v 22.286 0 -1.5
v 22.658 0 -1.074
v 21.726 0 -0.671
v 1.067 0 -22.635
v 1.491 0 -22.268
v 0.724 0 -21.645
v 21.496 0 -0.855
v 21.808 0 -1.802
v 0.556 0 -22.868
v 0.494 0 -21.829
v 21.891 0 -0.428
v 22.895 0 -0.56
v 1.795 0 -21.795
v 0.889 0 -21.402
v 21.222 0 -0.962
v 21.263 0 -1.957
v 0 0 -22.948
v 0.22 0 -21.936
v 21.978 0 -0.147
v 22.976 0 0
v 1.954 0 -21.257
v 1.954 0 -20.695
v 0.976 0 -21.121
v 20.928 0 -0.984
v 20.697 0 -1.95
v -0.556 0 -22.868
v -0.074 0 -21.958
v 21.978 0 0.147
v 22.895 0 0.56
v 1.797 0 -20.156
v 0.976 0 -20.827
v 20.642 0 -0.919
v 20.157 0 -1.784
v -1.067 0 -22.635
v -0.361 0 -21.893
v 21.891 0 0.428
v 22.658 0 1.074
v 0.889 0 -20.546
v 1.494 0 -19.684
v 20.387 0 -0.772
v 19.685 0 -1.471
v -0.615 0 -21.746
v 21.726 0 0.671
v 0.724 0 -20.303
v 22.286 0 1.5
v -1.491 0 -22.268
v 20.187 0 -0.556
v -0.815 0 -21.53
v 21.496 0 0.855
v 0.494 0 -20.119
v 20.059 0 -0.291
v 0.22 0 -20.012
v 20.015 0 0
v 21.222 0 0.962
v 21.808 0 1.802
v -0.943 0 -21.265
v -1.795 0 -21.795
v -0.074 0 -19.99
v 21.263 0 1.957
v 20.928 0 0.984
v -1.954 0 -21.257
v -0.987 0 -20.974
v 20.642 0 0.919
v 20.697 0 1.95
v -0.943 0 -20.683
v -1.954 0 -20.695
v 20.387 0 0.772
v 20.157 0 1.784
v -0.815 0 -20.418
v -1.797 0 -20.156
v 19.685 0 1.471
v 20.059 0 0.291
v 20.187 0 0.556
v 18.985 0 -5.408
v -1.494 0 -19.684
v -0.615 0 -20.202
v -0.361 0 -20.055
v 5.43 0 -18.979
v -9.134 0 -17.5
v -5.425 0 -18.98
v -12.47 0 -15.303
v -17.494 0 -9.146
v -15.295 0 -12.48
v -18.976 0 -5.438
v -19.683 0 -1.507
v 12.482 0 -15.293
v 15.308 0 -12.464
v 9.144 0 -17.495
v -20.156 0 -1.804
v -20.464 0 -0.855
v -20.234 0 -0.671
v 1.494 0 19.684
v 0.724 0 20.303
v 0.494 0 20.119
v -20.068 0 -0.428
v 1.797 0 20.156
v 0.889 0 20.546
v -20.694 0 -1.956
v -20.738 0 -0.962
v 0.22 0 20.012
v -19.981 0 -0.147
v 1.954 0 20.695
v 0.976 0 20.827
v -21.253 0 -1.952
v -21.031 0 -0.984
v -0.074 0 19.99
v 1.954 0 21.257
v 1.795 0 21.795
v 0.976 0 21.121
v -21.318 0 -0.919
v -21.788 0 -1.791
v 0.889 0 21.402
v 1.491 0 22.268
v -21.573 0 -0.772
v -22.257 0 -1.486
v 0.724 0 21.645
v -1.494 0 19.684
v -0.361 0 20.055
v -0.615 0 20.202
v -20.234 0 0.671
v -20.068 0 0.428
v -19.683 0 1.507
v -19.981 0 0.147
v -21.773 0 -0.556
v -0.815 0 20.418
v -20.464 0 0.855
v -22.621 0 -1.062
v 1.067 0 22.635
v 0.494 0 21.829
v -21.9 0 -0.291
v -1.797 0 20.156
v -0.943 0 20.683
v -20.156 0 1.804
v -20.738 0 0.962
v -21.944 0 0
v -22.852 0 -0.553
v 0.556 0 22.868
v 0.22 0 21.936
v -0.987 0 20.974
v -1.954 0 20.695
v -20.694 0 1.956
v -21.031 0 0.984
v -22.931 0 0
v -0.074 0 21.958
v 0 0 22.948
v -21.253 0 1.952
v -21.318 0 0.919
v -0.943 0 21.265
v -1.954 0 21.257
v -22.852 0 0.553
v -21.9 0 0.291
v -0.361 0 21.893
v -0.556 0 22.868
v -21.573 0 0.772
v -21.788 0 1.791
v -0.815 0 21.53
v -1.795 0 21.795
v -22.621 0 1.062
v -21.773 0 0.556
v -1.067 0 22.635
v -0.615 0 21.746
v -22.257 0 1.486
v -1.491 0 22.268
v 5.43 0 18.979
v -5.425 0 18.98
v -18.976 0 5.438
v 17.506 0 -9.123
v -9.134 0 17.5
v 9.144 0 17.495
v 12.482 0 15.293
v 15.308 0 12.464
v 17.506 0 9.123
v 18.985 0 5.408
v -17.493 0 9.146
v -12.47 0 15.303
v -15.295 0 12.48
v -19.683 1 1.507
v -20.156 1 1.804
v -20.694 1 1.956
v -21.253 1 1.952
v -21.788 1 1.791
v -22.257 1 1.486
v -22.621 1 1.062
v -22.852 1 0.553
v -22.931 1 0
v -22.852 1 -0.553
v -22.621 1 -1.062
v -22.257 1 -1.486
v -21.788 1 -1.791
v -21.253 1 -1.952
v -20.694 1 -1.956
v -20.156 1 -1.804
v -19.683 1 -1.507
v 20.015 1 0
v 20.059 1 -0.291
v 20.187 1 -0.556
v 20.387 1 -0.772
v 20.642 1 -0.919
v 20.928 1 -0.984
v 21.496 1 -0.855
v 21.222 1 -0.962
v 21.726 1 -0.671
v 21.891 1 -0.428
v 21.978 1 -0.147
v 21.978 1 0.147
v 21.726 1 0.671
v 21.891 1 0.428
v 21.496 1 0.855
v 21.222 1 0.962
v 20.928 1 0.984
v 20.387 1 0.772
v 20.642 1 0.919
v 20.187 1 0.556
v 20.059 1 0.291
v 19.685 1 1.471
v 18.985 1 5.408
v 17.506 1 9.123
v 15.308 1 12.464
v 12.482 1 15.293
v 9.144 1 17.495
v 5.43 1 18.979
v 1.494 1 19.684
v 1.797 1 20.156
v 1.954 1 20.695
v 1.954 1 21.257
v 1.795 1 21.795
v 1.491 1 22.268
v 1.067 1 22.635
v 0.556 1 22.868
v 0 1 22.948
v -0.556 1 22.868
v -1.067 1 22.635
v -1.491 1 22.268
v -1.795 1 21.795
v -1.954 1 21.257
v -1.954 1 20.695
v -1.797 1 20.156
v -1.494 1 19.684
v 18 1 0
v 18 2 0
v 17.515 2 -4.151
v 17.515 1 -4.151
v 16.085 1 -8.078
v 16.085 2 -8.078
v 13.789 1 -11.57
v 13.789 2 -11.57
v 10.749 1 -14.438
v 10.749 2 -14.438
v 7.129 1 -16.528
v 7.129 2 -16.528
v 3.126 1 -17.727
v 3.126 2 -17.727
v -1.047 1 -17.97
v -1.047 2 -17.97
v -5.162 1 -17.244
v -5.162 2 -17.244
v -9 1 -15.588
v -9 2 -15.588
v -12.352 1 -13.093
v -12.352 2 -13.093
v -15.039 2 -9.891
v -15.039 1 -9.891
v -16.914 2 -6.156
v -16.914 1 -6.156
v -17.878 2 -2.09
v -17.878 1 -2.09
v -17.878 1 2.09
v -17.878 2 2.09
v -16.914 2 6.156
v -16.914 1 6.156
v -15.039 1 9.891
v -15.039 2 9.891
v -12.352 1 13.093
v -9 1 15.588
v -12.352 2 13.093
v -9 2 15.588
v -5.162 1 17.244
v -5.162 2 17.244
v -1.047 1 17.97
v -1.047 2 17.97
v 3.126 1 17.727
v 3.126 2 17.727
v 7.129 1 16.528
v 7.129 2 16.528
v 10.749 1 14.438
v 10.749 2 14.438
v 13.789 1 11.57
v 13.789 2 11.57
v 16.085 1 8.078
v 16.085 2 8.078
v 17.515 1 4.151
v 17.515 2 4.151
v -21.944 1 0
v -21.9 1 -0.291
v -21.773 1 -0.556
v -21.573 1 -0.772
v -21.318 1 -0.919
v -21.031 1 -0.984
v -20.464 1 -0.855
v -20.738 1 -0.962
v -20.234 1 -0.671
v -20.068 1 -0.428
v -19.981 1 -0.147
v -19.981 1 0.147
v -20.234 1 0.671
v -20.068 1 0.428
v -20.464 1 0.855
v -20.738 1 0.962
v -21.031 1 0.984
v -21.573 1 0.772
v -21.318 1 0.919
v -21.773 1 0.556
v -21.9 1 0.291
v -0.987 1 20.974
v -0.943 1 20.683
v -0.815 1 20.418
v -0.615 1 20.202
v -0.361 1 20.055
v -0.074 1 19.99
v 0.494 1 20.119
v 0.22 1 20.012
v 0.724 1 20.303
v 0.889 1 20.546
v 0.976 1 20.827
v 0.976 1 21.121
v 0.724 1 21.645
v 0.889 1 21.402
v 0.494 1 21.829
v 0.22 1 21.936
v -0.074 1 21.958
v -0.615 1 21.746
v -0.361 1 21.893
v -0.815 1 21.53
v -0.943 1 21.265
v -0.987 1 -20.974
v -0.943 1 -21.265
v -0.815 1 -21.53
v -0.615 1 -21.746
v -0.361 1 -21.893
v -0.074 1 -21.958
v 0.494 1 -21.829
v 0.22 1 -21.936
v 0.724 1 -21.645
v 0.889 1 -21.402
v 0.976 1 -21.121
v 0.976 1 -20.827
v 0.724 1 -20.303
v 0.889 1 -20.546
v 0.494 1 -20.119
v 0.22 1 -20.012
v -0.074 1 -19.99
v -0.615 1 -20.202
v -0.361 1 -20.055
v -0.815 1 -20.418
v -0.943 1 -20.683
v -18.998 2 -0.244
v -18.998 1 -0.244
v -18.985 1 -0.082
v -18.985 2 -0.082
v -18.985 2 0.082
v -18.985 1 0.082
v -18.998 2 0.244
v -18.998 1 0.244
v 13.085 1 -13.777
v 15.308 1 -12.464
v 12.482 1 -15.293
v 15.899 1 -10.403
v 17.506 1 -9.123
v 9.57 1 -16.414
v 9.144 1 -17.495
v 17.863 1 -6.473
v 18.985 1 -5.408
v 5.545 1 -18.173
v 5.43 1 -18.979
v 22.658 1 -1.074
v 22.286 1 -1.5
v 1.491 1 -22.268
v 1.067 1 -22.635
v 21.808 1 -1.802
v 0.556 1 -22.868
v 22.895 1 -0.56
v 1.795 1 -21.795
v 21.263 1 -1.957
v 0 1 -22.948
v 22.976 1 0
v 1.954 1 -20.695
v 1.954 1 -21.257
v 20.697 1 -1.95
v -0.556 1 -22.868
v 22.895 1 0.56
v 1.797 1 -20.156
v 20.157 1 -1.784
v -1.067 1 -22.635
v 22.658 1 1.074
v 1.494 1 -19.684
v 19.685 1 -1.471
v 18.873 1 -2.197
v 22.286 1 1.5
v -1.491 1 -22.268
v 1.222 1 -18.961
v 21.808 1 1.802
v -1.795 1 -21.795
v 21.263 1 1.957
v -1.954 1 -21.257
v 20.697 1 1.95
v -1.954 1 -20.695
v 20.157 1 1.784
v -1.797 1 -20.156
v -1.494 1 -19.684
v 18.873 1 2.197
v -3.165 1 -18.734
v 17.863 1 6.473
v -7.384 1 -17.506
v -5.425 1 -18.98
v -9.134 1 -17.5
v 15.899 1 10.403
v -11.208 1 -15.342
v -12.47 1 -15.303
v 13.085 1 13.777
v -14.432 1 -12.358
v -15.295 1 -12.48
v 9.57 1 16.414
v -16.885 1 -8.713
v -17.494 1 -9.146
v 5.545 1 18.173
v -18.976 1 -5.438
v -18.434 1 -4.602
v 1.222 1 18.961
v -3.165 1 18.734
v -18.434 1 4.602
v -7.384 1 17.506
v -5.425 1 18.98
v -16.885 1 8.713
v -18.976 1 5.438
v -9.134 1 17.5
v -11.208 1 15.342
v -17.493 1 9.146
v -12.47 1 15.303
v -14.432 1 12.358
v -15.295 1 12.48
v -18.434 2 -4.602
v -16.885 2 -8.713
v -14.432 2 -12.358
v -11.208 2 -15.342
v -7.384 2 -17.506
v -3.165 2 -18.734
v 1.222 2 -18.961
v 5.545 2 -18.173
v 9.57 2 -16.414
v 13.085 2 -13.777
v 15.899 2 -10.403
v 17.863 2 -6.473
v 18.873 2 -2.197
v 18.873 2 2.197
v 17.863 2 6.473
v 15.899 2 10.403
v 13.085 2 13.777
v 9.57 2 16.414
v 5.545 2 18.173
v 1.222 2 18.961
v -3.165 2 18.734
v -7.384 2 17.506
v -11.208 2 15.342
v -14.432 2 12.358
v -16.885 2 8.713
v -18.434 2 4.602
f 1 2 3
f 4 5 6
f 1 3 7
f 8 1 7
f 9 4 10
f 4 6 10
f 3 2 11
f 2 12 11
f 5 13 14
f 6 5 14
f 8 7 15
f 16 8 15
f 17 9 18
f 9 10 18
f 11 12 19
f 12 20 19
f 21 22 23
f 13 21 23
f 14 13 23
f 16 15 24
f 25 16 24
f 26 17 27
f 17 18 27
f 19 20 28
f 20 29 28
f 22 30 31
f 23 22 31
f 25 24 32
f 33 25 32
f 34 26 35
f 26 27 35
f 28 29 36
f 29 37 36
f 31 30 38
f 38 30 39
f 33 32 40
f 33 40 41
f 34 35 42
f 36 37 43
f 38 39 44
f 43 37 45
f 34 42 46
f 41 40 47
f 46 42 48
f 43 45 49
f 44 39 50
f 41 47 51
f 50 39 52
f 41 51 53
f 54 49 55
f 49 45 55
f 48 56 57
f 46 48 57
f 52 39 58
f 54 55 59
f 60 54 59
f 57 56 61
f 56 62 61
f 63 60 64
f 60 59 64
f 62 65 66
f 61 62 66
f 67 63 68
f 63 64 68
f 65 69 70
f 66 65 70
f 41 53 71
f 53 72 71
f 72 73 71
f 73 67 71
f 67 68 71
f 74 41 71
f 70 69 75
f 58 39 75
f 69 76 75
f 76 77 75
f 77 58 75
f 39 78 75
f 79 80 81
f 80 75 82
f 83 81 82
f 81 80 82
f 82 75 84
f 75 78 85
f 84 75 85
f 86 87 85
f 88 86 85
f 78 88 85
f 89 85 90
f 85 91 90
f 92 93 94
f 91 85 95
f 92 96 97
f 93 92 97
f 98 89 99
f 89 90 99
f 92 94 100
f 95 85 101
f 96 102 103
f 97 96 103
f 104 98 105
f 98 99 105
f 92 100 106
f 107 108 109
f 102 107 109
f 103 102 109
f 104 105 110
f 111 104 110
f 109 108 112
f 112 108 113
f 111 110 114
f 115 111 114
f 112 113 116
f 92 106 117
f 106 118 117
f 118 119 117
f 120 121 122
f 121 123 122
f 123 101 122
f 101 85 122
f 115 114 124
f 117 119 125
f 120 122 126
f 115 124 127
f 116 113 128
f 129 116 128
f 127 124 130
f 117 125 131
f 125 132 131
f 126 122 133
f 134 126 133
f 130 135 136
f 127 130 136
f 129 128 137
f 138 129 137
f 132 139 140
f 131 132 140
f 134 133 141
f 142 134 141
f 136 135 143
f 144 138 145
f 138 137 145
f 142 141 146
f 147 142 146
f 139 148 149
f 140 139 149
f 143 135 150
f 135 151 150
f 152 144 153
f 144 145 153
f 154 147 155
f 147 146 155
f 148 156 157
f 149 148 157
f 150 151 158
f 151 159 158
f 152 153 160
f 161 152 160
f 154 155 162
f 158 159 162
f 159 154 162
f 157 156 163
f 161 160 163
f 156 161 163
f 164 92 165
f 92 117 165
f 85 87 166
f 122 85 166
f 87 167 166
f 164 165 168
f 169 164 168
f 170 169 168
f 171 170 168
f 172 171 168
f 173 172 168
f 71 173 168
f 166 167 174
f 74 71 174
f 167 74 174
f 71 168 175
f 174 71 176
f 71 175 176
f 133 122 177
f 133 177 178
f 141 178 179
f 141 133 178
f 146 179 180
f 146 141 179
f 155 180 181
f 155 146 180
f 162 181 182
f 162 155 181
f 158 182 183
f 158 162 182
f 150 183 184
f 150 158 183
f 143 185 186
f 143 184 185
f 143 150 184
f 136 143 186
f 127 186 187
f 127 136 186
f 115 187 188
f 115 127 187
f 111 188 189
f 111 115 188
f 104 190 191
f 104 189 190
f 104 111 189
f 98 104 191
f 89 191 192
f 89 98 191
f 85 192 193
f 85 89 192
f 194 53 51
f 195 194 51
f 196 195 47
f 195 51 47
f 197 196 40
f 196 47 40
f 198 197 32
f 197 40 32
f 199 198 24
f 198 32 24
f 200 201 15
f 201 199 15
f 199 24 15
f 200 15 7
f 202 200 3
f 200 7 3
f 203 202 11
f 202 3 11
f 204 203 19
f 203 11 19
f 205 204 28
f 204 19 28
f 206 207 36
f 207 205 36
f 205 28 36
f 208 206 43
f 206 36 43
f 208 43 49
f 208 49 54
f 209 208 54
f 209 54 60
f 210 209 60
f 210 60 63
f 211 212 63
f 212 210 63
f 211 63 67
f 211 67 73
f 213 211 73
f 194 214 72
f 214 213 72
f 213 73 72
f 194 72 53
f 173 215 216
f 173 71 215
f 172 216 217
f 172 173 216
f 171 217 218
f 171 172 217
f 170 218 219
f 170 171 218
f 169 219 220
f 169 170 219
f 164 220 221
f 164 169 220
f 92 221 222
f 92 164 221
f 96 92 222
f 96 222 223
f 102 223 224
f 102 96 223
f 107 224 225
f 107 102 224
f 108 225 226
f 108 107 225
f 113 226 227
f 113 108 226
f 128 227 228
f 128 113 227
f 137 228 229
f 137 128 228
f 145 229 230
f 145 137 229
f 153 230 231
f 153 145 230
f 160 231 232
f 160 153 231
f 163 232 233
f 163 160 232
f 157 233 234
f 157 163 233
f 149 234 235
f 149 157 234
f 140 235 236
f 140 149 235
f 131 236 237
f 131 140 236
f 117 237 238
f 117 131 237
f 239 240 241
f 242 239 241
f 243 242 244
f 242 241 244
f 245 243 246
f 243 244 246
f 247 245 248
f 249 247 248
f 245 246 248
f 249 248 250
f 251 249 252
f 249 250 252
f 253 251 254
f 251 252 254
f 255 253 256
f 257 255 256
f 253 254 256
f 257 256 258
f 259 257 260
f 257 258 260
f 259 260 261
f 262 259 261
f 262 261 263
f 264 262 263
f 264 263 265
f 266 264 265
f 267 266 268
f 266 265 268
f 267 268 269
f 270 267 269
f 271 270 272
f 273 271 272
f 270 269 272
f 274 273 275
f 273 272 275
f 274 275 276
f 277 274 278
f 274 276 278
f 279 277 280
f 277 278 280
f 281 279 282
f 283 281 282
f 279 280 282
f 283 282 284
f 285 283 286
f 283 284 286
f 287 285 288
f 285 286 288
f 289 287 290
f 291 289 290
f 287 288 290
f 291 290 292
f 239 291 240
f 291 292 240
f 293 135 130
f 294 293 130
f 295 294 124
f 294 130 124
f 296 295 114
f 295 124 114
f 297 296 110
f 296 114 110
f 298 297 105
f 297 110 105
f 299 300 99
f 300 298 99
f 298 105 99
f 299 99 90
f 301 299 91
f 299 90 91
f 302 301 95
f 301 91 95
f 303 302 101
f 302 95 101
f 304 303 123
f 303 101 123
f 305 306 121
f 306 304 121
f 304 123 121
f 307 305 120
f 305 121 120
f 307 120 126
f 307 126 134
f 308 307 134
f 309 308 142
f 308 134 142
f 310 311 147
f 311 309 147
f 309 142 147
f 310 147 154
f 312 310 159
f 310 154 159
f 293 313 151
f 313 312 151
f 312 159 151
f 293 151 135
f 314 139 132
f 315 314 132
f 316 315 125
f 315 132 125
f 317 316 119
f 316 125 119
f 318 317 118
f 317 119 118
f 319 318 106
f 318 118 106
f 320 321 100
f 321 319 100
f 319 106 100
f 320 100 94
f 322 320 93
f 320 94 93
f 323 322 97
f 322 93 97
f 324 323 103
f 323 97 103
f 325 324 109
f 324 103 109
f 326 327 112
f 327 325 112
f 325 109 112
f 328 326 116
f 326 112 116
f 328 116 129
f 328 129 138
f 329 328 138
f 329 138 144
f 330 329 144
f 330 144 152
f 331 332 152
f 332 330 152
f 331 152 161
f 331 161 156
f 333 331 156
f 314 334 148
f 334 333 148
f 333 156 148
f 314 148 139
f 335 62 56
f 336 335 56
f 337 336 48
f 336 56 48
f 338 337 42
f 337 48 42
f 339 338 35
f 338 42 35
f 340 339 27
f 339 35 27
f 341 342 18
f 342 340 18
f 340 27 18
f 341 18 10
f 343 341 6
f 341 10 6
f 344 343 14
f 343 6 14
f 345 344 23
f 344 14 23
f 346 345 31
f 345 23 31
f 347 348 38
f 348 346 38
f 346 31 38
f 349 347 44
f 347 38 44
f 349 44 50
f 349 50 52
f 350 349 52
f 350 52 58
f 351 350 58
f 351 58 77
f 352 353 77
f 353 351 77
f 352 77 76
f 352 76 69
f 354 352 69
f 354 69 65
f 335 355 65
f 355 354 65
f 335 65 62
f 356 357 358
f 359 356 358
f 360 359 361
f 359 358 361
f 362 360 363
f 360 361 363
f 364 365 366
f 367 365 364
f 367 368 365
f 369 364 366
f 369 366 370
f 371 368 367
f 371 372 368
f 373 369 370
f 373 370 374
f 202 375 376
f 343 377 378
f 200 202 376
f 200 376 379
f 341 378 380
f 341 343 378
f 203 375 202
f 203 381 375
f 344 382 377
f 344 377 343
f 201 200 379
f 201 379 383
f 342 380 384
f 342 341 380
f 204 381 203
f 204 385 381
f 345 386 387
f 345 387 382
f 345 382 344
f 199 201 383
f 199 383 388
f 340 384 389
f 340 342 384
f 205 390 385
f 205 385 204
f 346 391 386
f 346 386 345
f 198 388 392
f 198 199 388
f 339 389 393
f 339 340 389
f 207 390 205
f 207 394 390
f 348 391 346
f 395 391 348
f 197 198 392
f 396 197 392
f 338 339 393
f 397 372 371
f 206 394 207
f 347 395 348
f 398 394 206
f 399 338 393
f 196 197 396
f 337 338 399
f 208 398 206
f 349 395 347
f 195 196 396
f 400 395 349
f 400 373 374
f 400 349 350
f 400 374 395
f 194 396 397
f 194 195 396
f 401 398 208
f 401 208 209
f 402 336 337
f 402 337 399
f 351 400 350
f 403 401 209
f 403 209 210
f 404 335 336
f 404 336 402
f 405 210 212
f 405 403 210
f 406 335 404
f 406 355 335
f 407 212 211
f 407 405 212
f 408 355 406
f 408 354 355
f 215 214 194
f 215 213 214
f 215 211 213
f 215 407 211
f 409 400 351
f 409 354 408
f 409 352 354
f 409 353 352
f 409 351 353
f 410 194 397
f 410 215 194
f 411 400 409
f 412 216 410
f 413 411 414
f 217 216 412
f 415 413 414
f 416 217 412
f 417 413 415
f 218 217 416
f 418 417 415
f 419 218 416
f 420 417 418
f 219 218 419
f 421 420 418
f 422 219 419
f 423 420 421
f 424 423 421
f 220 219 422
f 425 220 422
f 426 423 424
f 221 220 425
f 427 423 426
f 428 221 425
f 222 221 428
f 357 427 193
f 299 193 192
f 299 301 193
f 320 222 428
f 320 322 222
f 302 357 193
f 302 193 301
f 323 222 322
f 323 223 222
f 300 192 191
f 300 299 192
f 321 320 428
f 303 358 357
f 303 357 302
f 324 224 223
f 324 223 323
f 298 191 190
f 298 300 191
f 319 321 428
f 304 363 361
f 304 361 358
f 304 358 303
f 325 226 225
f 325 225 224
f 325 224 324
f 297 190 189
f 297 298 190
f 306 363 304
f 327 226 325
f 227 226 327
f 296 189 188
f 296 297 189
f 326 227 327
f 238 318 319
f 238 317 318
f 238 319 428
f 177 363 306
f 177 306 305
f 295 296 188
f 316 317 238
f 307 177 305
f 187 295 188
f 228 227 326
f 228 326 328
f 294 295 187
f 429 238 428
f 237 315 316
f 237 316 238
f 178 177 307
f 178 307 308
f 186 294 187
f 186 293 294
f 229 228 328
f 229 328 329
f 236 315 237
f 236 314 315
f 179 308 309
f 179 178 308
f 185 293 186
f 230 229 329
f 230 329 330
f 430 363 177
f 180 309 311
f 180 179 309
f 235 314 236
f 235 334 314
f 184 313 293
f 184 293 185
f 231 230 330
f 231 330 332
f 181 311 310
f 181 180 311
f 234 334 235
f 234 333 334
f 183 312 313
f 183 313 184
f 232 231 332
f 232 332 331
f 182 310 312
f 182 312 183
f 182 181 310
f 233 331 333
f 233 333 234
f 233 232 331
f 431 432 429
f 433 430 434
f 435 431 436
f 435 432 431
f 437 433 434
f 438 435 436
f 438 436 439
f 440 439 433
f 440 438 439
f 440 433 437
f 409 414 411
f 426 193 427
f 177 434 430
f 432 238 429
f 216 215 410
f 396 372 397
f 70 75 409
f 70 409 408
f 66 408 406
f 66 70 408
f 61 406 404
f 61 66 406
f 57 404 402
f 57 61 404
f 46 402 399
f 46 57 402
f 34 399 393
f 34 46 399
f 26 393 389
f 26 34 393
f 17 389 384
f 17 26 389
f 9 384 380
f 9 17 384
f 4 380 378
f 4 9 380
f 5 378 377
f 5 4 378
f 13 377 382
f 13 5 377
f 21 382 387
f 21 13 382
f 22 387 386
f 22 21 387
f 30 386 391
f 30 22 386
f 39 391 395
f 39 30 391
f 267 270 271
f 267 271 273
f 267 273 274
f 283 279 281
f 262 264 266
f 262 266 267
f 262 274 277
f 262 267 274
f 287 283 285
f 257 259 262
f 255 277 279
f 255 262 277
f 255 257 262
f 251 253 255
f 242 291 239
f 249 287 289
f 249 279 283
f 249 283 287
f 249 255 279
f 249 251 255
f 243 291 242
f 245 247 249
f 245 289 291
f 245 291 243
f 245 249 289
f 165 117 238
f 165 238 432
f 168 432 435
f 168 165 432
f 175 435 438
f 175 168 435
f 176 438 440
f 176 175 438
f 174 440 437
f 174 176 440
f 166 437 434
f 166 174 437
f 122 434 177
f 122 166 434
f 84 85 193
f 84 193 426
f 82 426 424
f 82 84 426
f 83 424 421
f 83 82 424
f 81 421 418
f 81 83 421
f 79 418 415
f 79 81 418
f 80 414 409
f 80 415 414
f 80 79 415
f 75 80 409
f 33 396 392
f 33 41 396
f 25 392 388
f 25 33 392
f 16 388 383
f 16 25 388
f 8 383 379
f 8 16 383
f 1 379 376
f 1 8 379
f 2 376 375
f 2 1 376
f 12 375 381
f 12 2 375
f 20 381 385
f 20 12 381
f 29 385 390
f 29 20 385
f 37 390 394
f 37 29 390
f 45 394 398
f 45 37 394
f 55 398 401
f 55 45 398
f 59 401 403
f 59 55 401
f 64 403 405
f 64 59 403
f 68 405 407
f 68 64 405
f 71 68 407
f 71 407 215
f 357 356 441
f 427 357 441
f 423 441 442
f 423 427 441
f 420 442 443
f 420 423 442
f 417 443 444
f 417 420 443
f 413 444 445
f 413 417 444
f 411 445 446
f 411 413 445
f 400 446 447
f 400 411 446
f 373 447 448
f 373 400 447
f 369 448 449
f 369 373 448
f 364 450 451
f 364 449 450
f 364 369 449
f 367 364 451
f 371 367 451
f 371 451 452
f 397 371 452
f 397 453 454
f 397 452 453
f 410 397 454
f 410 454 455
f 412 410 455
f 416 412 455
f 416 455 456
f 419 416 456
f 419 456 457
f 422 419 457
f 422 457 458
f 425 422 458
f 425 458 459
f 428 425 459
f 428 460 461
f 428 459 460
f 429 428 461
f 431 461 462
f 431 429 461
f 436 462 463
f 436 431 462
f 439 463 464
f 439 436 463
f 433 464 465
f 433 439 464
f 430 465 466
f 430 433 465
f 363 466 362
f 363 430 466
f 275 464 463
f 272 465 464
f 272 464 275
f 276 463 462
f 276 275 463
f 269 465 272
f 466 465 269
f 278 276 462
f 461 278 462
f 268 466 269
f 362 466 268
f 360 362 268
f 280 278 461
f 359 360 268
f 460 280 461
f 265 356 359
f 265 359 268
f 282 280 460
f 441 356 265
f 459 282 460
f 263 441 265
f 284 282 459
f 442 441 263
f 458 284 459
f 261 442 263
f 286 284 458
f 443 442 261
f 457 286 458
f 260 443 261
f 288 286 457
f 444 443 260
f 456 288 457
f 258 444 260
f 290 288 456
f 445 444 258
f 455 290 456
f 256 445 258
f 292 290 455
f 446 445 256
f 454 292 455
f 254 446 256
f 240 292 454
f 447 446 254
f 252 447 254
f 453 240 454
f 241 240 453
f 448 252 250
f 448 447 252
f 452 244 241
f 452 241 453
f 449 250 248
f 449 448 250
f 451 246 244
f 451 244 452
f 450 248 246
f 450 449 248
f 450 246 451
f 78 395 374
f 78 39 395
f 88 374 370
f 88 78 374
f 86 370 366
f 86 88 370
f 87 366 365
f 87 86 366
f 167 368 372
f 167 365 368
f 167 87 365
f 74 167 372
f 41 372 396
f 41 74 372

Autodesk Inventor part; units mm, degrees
ref_plane "YZ Plane" through (0, 0, 0) normal (1, 0, 0) x (0, 1, 0)
ref_plane "XZ Plane" through (0, 0, 0) normal (0, 1, 0) x (-1, 0, 0)
ref_plane "XY Plane" through (0, 0, 0) normal (0, 0, 1) x (1, 0, 0)
sketch "Sketch1" plane through (0, 0, 0) normal (0, 1, 0) x (-1, 0, 0)
  arc A0 (18.9984, 0.2445) -> (18.9984, -0.2445) centre (0, 0) ccw
  circle A1 centre (0, 20.974) radius 0.987
  circle A2 centre (0, -20.974) radius 0.987
  arc A3 (18.9984, 0.2445) -> (18.9984, -0.2445) centre (0, 0) ccw
  arc A4 (18.9984, 0.2445) -> (18.9984, -0.2445) centre (20.9573, 0) ccw
  circle A5 centre (20.9573, 0) radius 0.987
  circle A6 centre (-21.0021, 0) radius 0.987
  arc A7 (-1.4939, 19.6837) -> (-19.6854, 1.4707) centre (0, 0) ccw
  arc A8 (-19.6854, 1.4707) -> (-19.6854, -1.4707) centre (-21.0021, 0) ccw
  arc A9 (-19.6854, -1.4707) -> (-1.4939, -19.6837) centre (0, 0) ccw
  arc A10 (-1.4939, -19.6837) -> (1.4939, -19.6837) centre (0, -20.974) ccw
  arc A11 (1.4939, -19.6837) -> (19.6826, -1.5074) centre (0, 0) ccw
  arc A12 (19.6826, -1.5074) -> (19.6826, 1.5074) centre (20.9573, 0) ccw
  arc A13 (19.6826, 1.5074) -> (1.4939, 19.6837) centre (0, 0) ccw
  arc A14 (1.4939, 19.6837) -> (-1.4939, 19.6837) centre (0, 20.974) ccw
  dimension "d0" = 19
extrude "Extrusion1" add sketch "Sketch1" along normal blind 1
sketch "Sketch2" plane through (0, 1, 0) normal (0, 1, 0) x (1, 0, 0)
  arc A0 (-18.9984, -0.2445) -> (-18.9984, 0.2445) centre (0, 0) ccw projected
  arc A1 (-18.9984, -0.2445) -> (-18.9984, 0.2445) centre (-20.9573, 0) ccw projected
  arc A2 (-18.9984, -0.2445) -> (-18.9984, 0.2445) centre (0, 0) ccw projected
  circle A3 centre (-20.9573, 0) radius 0.987 projected
  circle A4 centre (0, 20.974) radius 0.987 projected
  circle A5 centre (21.0021, 0) radius 0.987 projected
  circle A6 centre (0, -20.974) radius 0.987 projected
  arc A7 (1.4939, -19.6837) -> (19.6854, -1.4707) centre (0, 0) ccw projected
  arc A8 (19.6854, -1.4707) -> (19.6854, 1.4707) centre (21.0021, 0) ccw projected
  arc A9 (19.6854, 1.4707) -> (1.4939, 19.6837) centre (0, 0) ccw projected
  arc A10 (1.4939, 19.6837) -> (-1.4939, 19.6837) centre (0, 20.974) ccw projected
  arc A11 (-1.4939, 19.6837) -> (-19.6826, 1.5074) centre (0, 0) ccw projected
  arc A12 (-19.6826, 1.5074) -> (-19.6826, -1.5074) centre (-20.9573, 0) ccw projected
  arc A13 (-19.6826, -1.5074) -> (-1.4939, -19.6837) centre (0, 0) ccw projected
  arc A14 (-1.4939, -19.6837) -> (1.4939, -19.6837) centre (0, -20.974) ccw projected
extrude "Extrusion2" add sketch "Sketch2" along normal mid plane 2 contours A1 A0
sketch "Sketch3" plane through (0, 0, 0) normal (0, -1, 0) x (1, 0, 0)
  point P0 (0, 0)
sketch "Sketch4" plane through (0, 2, 0) normal (0, 1, 0) x (1, 0, 0)
  arc A0 (-18.9984, -0.2445) -> (-18.9984, 0.2445) centre (0, 0) ccw projected
  circle A1 centre (0, 0) radius 18
  dimension "d5" = 36
extrude "Extrusion3" cut sketch "Sketch4" against normal blind 1
properties part number "tapa"
